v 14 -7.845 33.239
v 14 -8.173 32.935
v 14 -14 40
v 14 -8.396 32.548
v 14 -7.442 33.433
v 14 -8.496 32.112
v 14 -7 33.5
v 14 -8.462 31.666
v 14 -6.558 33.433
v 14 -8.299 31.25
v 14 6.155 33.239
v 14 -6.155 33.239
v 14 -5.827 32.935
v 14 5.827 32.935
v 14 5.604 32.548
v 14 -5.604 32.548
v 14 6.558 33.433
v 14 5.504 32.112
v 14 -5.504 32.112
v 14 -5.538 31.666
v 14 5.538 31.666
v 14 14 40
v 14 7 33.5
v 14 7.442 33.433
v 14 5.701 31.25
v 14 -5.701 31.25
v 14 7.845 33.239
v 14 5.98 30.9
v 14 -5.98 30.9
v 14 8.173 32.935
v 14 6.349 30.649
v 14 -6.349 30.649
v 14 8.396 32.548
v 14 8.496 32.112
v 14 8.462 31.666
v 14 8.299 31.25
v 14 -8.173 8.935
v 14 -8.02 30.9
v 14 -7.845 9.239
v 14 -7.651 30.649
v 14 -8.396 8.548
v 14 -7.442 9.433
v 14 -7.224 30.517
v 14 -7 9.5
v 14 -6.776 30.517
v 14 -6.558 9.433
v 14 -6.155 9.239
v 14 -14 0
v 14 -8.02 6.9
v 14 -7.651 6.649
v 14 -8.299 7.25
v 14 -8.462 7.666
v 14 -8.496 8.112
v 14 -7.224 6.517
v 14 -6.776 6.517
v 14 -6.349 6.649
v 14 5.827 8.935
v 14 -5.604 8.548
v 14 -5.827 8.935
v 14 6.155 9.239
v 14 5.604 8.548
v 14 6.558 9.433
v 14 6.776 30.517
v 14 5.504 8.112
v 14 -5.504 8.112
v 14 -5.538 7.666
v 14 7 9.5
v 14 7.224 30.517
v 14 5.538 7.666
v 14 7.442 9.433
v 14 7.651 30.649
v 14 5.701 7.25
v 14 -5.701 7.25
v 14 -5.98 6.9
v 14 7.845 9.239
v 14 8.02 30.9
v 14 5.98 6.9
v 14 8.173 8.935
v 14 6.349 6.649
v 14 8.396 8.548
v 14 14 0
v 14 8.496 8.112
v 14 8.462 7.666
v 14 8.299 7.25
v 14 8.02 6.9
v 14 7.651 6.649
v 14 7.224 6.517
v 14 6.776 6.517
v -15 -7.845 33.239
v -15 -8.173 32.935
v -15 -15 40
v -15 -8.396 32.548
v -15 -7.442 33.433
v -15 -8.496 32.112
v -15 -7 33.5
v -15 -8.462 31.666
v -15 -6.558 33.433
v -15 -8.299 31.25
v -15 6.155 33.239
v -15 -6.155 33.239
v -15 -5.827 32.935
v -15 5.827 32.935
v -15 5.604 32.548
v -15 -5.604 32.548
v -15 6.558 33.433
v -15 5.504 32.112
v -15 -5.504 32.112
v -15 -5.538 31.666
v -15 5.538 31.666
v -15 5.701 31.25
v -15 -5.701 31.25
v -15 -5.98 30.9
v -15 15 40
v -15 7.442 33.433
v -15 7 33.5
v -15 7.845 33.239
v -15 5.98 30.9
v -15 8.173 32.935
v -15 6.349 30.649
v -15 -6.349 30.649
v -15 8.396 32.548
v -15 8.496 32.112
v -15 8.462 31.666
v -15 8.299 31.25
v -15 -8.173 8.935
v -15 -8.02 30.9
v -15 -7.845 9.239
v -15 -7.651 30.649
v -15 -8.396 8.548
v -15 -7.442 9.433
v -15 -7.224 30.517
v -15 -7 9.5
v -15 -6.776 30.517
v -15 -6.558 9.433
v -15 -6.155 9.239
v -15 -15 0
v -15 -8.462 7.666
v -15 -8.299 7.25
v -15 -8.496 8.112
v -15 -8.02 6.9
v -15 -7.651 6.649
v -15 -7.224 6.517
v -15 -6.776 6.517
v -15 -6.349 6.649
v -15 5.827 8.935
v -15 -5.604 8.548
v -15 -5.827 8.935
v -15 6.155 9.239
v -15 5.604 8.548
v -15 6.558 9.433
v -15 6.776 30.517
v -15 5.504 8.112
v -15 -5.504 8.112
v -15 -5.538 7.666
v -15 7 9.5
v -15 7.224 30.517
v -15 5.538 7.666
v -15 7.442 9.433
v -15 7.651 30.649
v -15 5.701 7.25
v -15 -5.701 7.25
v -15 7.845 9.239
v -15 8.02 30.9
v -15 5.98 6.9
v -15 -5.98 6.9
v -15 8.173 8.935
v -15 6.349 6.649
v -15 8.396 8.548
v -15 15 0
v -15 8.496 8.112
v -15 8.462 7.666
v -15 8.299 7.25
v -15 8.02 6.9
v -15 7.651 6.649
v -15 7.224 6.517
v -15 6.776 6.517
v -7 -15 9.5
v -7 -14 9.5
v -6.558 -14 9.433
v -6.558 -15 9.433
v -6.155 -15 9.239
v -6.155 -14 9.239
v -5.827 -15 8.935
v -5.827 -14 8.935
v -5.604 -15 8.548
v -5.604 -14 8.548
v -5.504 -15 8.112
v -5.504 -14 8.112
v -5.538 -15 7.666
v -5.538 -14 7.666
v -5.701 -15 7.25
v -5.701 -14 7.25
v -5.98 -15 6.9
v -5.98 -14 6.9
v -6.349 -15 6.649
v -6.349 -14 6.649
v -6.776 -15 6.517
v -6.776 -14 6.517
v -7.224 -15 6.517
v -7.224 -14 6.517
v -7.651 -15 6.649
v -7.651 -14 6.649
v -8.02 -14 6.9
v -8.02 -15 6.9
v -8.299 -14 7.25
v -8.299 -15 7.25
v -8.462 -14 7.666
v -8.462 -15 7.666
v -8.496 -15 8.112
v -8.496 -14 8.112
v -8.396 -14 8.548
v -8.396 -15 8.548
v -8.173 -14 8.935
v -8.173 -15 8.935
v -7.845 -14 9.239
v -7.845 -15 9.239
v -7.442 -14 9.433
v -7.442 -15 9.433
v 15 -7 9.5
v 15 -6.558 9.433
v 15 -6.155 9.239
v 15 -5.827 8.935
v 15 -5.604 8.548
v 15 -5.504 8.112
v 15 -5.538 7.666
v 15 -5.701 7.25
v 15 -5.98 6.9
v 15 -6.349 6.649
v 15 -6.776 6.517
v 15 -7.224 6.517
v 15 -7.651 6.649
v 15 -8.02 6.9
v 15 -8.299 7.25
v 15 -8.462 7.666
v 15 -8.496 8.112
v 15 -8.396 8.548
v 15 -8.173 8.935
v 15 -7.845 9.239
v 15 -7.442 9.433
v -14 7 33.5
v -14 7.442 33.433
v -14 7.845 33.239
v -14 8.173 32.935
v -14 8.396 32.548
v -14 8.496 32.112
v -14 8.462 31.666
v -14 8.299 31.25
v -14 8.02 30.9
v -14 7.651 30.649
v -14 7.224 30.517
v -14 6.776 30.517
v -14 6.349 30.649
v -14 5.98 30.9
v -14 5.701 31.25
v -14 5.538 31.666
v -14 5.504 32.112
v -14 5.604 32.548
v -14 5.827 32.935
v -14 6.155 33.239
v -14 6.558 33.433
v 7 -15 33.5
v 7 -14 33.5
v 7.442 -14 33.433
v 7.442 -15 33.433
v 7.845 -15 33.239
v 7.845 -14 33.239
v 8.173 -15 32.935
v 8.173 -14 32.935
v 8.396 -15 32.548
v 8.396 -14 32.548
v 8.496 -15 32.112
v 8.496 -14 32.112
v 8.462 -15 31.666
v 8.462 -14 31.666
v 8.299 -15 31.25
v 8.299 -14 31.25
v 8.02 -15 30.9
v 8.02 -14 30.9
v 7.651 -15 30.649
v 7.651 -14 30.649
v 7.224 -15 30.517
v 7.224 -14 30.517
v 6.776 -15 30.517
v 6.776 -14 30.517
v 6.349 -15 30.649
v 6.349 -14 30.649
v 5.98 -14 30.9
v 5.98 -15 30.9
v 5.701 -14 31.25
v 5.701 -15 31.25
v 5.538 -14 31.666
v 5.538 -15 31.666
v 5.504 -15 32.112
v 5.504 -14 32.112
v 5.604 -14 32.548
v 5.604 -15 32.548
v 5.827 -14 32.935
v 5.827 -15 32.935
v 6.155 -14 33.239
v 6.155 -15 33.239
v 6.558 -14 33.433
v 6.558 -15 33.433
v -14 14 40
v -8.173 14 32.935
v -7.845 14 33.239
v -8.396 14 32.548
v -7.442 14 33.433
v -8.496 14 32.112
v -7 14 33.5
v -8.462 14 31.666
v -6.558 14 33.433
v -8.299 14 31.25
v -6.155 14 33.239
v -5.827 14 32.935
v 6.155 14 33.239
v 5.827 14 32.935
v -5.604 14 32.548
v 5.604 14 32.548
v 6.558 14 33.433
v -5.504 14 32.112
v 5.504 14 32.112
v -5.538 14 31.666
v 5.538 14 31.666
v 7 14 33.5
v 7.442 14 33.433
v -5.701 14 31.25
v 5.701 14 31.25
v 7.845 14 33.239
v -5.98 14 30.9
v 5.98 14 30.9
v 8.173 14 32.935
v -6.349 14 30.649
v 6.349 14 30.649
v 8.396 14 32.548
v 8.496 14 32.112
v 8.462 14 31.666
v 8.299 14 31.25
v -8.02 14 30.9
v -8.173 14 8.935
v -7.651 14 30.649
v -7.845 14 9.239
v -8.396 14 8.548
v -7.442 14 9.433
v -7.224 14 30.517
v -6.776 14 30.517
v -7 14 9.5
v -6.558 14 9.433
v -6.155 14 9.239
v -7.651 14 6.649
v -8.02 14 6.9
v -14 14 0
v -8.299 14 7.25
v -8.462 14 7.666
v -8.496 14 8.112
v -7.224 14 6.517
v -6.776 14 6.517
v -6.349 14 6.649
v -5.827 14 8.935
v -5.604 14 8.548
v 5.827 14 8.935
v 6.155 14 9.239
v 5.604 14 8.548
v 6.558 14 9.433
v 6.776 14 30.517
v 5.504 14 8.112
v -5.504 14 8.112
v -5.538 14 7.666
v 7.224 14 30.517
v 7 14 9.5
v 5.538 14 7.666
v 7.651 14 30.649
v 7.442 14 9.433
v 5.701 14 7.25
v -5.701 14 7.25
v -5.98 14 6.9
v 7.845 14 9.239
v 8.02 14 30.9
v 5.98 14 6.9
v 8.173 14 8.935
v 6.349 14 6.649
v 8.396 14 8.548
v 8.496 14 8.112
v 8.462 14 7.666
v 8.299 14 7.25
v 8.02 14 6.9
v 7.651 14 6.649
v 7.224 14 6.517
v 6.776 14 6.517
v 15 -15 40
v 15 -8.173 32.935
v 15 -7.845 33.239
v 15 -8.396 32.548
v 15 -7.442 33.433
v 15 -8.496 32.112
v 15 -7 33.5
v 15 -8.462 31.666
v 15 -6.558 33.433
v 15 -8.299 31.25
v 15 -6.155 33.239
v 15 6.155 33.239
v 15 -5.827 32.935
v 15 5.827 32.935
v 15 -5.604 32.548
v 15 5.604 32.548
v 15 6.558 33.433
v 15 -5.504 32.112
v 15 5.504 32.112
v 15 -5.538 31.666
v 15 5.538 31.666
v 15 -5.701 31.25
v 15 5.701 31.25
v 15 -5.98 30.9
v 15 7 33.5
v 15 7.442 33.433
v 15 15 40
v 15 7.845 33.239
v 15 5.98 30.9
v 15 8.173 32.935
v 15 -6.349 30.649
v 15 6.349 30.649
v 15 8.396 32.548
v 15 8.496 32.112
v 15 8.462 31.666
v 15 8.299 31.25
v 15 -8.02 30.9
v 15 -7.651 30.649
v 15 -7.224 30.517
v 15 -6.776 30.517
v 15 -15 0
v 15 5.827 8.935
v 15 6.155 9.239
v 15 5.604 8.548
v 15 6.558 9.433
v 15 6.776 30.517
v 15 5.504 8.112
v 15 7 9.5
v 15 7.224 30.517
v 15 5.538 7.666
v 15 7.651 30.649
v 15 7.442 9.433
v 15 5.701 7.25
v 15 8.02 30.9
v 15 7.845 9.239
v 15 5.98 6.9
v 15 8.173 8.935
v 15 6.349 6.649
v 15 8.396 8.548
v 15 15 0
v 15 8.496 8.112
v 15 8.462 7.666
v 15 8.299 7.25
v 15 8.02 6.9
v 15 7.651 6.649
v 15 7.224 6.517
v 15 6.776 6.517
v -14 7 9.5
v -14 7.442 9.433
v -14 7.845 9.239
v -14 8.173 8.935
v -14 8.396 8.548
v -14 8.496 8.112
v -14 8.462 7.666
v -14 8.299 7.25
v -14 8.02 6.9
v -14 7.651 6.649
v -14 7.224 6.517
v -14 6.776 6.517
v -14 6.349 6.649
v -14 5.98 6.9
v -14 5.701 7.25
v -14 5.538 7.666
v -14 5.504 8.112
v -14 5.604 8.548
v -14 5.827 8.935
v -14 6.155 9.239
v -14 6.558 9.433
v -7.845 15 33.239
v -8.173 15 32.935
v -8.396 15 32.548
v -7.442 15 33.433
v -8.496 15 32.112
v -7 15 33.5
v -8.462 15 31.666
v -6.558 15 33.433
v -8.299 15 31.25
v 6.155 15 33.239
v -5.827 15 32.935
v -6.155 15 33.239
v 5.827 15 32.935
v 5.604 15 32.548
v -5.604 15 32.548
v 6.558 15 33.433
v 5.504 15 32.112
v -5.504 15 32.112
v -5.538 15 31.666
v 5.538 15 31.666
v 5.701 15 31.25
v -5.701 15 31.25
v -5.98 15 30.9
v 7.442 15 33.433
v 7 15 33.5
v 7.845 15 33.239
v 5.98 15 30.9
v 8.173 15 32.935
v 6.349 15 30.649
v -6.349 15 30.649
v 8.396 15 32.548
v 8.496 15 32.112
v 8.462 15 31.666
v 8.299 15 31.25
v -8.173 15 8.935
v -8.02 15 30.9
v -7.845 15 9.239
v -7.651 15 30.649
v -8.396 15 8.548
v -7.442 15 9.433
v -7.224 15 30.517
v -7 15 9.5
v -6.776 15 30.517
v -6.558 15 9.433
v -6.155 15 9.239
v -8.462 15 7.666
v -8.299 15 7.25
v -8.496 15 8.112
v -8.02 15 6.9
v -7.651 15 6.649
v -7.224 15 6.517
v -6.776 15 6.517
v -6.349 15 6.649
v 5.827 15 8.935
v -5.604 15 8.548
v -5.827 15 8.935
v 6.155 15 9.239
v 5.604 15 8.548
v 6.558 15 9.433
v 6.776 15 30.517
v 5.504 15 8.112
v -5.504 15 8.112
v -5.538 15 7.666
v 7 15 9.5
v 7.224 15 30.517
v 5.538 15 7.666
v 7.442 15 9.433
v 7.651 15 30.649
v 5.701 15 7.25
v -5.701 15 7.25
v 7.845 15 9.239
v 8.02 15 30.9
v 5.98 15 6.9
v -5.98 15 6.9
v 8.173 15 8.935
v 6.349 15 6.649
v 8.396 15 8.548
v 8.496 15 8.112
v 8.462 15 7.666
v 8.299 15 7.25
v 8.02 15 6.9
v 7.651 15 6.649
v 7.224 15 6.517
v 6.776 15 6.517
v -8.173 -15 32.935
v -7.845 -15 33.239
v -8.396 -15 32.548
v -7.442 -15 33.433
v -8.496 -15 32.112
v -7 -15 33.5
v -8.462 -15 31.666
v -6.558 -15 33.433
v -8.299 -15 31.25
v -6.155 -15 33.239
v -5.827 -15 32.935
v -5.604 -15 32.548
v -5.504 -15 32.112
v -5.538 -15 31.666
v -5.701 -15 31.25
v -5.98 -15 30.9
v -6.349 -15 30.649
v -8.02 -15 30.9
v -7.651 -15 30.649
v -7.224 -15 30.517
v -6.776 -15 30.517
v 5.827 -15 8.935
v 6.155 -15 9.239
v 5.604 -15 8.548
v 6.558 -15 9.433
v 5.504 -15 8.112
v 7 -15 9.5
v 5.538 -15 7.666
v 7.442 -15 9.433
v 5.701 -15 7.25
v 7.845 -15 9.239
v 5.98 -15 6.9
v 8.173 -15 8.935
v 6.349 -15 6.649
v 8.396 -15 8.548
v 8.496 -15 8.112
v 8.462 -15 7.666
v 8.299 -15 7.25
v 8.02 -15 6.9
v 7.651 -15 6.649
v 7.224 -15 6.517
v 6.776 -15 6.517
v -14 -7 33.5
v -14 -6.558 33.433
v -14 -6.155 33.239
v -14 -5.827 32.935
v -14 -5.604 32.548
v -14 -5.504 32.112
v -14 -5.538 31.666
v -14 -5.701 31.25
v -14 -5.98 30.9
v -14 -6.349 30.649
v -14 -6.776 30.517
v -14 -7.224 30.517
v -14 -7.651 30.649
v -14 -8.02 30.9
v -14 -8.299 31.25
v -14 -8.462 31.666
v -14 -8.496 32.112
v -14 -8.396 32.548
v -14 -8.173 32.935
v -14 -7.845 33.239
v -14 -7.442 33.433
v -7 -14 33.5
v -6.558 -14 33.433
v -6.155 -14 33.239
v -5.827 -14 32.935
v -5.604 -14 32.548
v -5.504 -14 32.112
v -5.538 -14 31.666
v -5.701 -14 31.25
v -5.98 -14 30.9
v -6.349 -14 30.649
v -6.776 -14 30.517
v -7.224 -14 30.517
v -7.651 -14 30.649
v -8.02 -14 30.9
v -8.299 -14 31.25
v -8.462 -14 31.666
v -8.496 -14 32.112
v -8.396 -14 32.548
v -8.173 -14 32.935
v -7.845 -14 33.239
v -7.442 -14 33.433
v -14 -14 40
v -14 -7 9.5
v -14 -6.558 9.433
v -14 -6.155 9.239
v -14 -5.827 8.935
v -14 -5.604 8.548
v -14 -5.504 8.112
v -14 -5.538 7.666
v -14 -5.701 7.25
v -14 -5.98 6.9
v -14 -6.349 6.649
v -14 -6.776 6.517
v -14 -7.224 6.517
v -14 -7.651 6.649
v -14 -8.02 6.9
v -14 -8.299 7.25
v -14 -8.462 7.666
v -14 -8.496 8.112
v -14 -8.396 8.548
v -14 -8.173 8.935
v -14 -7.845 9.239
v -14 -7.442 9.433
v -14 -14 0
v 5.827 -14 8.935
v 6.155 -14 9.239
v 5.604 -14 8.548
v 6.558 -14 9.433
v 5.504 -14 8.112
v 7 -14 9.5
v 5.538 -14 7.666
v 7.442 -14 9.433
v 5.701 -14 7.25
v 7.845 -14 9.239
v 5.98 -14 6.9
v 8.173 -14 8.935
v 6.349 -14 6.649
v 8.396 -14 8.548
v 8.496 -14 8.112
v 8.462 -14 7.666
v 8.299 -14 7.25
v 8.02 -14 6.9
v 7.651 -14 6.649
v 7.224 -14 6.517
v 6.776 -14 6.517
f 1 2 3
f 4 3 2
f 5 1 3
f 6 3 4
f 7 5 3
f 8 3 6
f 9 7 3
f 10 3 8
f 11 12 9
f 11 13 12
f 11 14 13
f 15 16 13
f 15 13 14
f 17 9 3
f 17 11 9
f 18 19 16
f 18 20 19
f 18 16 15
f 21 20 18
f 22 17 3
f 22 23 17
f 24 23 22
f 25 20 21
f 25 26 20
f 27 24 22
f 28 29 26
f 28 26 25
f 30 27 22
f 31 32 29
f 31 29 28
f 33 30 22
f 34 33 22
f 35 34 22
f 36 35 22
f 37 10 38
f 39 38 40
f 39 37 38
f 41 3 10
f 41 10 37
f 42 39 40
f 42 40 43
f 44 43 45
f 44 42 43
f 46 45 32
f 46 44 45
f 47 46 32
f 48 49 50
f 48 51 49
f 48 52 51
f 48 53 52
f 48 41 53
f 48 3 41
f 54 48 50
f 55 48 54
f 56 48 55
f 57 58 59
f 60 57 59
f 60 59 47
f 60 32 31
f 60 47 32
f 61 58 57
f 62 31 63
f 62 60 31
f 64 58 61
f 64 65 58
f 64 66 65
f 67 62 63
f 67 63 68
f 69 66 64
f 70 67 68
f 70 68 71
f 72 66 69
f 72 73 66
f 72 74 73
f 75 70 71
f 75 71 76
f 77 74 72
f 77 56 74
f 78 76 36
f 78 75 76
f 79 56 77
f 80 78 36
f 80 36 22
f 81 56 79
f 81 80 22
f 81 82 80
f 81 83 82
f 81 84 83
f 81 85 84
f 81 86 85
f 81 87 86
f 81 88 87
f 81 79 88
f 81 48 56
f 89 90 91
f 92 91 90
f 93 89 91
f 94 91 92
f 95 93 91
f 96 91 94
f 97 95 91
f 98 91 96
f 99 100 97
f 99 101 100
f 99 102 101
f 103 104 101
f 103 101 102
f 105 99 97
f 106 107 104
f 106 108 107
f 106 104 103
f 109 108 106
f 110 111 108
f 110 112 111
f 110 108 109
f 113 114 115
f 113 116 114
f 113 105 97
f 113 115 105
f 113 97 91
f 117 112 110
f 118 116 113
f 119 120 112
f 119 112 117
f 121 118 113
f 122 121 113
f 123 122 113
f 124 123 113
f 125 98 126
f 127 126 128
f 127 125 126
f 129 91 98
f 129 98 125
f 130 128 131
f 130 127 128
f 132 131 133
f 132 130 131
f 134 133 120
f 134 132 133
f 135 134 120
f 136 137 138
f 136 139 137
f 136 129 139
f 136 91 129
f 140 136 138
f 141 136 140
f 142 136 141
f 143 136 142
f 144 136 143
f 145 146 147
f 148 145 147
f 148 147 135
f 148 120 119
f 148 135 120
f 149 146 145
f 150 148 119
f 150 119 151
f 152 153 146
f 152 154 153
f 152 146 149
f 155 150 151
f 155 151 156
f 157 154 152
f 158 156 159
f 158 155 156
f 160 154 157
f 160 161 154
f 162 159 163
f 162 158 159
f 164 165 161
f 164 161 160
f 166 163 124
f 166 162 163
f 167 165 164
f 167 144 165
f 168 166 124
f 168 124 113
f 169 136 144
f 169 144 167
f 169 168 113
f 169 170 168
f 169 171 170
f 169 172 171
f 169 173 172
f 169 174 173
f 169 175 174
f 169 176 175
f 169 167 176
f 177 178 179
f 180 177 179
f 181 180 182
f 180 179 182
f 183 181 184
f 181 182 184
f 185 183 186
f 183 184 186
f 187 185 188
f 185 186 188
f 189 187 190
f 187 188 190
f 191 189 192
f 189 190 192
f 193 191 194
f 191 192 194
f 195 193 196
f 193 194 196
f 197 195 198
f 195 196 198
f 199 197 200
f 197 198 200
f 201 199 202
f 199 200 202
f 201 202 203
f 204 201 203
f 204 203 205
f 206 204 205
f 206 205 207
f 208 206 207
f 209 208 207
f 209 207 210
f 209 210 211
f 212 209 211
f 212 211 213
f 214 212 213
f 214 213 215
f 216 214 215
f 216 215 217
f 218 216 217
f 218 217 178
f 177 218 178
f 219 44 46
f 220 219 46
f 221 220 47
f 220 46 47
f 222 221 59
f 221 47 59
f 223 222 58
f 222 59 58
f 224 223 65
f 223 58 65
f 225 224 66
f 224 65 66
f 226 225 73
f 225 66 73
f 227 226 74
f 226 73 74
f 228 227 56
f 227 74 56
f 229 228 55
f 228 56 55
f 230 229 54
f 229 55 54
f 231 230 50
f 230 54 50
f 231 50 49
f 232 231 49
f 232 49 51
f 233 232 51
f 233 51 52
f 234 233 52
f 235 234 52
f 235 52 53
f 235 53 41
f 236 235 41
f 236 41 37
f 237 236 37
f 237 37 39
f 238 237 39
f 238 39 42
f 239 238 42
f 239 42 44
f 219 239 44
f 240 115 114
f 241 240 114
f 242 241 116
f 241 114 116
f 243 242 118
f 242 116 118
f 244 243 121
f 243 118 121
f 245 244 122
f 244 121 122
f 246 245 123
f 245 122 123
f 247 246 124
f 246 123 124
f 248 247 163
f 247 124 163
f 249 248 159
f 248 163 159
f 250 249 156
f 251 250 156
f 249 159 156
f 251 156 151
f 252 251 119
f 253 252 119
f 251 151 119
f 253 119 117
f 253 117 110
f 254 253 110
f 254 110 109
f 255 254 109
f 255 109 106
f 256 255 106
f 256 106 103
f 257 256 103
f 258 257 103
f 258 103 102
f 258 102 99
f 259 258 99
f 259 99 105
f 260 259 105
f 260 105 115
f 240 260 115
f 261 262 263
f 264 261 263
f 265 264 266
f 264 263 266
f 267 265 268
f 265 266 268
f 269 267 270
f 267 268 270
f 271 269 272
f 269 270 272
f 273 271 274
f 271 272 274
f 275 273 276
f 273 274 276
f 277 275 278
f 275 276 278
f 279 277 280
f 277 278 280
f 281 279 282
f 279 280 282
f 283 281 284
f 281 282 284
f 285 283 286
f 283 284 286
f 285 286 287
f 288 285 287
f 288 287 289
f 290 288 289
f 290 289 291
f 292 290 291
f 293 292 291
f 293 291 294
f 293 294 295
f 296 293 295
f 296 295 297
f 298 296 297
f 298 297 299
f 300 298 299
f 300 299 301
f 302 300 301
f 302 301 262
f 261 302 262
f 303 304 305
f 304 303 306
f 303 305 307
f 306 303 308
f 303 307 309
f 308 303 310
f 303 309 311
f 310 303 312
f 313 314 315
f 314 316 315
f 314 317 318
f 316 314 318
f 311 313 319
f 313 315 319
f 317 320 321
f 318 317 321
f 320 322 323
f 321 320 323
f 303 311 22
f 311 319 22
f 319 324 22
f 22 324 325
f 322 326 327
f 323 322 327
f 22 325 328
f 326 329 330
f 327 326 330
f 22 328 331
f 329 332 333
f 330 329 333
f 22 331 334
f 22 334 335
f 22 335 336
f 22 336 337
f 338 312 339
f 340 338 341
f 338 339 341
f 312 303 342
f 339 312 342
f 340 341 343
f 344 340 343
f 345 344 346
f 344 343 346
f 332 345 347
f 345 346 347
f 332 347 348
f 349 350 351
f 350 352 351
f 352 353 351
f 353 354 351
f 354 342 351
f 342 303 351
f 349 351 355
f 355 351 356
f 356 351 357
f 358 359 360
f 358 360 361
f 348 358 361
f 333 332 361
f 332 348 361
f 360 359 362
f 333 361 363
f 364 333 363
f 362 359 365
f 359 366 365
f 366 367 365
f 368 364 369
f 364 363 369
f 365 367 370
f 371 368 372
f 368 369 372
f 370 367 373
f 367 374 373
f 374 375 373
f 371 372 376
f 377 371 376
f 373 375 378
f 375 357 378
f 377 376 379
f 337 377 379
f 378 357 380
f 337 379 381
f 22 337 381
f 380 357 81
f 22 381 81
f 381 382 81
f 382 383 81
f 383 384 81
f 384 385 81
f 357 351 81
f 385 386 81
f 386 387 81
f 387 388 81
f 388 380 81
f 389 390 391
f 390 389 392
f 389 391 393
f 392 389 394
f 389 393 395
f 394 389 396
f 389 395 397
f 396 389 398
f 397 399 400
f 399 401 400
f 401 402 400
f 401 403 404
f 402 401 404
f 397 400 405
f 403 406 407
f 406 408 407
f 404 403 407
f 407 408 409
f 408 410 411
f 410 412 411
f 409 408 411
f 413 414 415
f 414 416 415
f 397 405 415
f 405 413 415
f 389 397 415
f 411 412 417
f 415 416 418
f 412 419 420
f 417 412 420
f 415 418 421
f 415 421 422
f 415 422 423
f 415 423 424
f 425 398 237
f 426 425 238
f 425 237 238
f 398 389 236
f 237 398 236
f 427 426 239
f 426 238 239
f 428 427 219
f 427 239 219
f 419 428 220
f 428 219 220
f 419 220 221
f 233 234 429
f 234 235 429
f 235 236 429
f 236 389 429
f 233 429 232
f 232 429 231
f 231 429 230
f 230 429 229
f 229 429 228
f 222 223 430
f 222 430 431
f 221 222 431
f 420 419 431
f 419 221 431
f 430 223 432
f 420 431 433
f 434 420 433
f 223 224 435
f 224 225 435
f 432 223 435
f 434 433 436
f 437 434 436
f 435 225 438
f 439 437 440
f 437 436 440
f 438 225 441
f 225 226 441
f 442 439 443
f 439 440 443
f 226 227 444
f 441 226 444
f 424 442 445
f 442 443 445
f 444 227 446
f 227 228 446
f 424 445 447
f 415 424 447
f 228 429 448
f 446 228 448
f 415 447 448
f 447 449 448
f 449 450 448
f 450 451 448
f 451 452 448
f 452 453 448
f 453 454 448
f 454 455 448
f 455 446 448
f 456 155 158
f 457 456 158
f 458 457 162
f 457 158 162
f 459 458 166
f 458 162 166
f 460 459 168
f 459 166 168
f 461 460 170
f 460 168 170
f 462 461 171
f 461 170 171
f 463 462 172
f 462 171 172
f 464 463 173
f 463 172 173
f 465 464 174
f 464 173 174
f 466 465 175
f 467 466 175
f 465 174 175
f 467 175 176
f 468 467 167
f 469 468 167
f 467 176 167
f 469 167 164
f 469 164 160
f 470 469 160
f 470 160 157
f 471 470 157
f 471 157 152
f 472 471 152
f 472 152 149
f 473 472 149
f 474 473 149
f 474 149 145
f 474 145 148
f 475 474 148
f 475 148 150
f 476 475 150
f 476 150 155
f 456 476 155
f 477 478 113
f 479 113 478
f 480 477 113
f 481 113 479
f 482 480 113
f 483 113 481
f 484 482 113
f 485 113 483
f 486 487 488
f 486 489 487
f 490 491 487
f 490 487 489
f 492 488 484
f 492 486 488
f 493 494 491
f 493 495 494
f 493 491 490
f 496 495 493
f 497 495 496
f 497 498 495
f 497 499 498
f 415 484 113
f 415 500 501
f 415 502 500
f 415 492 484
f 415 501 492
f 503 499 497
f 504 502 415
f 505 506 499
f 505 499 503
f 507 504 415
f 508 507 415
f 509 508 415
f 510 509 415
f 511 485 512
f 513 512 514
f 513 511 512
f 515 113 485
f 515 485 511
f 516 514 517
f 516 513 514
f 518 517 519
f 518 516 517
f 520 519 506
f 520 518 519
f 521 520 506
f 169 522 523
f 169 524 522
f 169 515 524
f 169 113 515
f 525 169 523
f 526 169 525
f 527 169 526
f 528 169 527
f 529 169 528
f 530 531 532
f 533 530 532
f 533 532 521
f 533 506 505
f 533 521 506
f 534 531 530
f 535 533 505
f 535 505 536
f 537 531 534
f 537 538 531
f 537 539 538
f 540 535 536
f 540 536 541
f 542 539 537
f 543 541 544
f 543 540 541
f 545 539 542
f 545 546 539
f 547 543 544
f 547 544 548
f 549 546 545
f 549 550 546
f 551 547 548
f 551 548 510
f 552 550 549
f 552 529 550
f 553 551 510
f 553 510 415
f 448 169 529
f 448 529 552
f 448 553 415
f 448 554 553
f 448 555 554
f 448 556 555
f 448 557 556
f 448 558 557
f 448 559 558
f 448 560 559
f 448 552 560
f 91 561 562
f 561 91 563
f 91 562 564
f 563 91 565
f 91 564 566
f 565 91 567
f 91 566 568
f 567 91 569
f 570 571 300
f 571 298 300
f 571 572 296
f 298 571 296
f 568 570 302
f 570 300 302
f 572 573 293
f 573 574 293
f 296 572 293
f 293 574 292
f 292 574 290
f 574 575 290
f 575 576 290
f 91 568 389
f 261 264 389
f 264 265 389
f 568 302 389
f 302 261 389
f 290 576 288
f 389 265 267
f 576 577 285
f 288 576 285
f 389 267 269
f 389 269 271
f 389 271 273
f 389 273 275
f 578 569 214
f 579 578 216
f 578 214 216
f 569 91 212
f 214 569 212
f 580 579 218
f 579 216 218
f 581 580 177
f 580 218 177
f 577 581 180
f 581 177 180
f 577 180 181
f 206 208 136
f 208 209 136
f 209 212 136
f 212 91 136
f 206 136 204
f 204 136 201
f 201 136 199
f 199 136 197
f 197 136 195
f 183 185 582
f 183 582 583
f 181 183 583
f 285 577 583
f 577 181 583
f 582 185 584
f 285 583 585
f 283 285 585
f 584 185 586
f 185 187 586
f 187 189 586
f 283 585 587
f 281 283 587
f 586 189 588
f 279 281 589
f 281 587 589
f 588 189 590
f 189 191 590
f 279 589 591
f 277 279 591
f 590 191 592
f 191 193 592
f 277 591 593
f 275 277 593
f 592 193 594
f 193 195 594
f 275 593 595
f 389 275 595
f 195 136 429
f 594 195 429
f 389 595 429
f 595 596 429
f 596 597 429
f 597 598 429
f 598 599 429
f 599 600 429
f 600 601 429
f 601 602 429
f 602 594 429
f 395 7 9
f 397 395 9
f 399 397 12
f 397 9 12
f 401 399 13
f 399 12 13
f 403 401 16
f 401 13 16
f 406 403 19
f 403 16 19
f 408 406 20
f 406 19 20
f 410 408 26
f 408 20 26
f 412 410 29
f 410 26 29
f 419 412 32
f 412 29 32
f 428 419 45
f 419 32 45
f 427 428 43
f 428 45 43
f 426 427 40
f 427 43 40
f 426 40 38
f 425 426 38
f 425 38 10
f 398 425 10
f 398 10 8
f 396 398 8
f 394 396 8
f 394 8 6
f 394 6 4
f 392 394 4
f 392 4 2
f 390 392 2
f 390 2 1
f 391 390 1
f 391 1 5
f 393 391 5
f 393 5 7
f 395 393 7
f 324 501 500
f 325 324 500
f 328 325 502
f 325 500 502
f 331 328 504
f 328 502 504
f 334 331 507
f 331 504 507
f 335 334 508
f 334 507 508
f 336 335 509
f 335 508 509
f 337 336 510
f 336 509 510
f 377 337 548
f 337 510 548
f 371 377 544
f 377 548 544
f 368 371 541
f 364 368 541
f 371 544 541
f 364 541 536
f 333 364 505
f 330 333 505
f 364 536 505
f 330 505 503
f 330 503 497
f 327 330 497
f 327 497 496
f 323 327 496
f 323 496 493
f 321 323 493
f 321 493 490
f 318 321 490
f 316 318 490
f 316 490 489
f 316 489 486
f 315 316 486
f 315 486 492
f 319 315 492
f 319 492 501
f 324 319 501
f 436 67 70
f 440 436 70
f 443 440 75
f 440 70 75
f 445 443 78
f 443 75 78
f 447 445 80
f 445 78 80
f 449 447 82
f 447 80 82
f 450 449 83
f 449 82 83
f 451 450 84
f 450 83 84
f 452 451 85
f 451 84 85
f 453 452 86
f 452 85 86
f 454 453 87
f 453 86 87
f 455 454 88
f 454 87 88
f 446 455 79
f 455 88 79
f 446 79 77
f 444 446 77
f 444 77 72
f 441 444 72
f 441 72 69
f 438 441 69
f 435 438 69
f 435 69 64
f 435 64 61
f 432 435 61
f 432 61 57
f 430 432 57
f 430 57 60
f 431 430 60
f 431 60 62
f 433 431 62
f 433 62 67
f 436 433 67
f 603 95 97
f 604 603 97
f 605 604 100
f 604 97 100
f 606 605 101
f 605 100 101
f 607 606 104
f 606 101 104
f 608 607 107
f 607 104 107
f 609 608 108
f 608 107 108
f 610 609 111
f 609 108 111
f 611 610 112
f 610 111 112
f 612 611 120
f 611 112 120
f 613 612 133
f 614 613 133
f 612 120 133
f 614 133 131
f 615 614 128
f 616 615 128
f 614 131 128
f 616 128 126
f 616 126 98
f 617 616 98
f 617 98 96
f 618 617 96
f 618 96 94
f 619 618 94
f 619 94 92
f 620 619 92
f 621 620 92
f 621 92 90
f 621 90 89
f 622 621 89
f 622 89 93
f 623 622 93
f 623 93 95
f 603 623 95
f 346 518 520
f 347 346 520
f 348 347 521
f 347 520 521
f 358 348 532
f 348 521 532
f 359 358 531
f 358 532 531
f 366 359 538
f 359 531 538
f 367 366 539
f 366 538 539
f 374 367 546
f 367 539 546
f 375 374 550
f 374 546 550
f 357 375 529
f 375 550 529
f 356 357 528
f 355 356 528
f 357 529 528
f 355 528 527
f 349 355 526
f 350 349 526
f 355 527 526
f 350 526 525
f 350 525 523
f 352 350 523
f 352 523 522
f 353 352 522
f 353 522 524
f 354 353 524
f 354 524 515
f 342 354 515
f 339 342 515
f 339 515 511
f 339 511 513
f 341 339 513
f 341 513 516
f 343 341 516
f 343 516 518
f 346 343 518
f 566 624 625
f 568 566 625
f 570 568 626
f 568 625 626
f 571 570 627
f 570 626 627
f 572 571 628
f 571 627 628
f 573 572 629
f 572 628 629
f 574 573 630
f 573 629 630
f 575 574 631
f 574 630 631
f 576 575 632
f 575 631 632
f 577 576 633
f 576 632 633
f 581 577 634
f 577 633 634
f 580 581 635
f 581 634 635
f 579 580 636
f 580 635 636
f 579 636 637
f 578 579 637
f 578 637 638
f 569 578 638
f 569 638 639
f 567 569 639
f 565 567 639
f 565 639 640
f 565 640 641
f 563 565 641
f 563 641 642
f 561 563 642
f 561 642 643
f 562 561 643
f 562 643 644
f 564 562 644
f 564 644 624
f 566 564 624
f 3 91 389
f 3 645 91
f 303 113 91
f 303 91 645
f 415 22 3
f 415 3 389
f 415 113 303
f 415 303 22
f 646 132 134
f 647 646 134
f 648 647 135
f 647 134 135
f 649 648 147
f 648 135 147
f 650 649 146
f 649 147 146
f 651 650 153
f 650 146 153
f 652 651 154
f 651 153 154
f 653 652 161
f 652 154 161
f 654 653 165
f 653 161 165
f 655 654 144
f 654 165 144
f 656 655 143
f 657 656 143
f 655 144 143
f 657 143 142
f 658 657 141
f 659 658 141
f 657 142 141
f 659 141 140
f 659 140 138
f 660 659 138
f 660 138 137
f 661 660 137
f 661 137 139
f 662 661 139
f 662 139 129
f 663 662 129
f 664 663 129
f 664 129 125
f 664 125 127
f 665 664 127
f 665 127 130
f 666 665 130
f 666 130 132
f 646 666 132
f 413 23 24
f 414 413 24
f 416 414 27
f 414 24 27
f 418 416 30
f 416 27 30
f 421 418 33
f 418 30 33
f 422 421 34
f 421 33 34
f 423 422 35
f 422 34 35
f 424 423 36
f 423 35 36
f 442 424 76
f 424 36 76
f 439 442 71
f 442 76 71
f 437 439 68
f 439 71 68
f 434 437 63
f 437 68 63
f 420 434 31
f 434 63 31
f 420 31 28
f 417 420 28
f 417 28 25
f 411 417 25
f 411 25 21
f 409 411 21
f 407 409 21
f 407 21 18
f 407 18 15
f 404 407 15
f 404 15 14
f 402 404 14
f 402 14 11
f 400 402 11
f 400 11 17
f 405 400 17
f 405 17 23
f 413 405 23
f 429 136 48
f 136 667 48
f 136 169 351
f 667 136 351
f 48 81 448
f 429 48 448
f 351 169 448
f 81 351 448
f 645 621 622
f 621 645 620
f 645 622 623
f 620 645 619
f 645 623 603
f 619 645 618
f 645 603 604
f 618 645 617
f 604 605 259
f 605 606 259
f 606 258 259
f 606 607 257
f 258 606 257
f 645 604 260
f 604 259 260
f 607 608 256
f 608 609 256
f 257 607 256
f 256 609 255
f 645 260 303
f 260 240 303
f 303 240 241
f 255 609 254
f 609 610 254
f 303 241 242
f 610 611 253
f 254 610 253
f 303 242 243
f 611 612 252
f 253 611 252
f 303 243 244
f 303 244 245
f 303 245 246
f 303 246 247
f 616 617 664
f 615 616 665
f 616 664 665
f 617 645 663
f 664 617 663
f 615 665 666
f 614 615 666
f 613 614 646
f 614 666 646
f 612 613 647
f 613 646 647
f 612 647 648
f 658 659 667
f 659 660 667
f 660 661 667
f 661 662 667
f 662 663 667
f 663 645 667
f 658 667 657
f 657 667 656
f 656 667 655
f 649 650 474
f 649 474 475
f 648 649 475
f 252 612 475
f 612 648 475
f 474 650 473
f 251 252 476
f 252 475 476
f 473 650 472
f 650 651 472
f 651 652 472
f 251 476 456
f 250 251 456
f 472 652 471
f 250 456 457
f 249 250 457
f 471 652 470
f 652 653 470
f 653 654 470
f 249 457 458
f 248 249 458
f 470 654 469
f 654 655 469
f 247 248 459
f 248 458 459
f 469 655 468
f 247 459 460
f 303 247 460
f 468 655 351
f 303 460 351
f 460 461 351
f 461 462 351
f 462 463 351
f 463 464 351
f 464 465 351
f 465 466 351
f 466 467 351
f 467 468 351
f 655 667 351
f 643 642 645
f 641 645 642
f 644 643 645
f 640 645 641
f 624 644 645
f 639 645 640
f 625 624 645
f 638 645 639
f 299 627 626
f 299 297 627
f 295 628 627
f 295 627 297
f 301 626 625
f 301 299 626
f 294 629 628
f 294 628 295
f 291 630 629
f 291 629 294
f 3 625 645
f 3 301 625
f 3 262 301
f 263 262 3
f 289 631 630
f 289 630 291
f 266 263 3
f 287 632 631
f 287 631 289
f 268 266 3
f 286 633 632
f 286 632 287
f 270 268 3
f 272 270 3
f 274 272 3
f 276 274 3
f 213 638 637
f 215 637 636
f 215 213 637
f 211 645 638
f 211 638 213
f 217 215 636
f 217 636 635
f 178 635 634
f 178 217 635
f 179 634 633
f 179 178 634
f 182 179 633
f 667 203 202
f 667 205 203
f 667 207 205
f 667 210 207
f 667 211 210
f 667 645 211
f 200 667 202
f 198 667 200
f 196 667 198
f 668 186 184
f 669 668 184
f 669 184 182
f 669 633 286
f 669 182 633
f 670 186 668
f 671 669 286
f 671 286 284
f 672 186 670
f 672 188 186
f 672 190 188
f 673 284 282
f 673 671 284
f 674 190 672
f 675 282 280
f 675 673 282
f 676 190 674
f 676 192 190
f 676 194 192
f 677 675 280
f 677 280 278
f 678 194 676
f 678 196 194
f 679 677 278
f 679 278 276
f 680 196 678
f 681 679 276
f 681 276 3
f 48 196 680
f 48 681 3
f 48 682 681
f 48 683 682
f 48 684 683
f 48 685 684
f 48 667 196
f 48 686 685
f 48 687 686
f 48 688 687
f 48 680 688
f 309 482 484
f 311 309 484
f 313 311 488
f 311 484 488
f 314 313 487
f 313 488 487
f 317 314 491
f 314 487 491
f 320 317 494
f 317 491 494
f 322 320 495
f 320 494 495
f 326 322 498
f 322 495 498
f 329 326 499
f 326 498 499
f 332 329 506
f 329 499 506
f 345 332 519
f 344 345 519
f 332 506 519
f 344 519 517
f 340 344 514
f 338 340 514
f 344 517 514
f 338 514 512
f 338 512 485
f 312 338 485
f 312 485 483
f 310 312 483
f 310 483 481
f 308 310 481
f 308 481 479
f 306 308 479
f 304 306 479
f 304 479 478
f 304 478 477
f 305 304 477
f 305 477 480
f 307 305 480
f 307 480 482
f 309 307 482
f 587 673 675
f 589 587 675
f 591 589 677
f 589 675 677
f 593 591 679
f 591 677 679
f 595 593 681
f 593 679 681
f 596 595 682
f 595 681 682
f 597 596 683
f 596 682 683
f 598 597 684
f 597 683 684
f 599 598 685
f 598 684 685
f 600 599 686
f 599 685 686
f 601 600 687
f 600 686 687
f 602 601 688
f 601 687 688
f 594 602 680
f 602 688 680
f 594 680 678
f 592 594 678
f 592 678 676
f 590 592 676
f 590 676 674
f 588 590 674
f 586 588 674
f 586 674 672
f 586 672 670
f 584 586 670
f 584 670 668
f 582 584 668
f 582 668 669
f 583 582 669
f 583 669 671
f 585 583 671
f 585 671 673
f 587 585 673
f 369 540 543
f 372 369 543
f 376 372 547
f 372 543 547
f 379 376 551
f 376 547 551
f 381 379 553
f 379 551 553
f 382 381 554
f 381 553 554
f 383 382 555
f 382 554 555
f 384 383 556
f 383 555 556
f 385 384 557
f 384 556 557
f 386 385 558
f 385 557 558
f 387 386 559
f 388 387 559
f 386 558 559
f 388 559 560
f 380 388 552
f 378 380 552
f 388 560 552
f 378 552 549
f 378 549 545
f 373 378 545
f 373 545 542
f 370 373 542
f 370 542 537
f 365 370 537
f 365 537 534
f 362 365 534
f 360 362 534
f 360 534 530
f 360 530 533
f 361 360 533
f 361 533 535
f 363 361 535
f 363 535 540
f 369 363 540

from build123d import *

# Parameters (mm, degrees)
SKETCH_1_W          = 30
SKETCH_1_H          = 30
SKETCH_1_W_2        = 28
SKETCH_1_H_2        = 28
EXTRUDE_1_DEPTH     = 40
SKETCH_2_R          = 1.5
CUT_EXTRUDE_1_DEPTH = 53.201532545
SKETCH_3_R          = 1.5
CUT_EXTRUDE_2_DEPTH = 53.201532545


with BuildPart() as part:
    # 草图1 → 凸台-拉伸1 (new body)
    with BuildSketch(Plane.XY):
        Rectangle(SKETCH_1_W, SKETCH_1_H)
        Rectangle(SKETCH_1_W_2, SKETCH_1_H_2, mode=Mode.SUBTRACT)
    extrude(amount=EXTRUDE_1_DEPTH)

    # 草图2 → 切除-拉伸1 (cut, through all)
    with BuildSketch(Plane.ZY.offset(15)):
        with Locations((32, -7)):
            Circle(SKETCH_2_R)
        with Locations((8, -7)):
            Circle(SKETCH_2_R)
        with Locations((32, 7)):
            Circle(SKETCH_2_R)
        with Locations((8, 7)):
            Circle(SKETCH_2_R)
    extrude(amount=-CUT_EXTRUDE_1_DEPTH, mode=Mode.SUBTRACT)

    # 草图3 → 切除-拉伸2 (cut, through all)
    with BuildSketch(Plane(origin=(0, 15, 0), x_dir=(1, 0, 0), z_dir=(0, 1, 0))):
        with Locations(Location((7, -32, 0), (0, 0, 270))):
            Circle(SKETCH_3_R)
        with Locations(Location((-7, -32, 0), (0, 0, 270))):
            Circle(SKETCH_3_R)
        with Locations(Location((7, -8, 0), (0, 0, 270))):
            Circle(SKETCH_3_R)
        with Locations(Location((-7, -8, 0), (0, 0, 270))):
            Circle(SKETCH_3_R)
    extrude(amount=-CUT_EXTRUDE_2_DEPTH, mode=Mode.SUBTRACT)


solid = part.part
